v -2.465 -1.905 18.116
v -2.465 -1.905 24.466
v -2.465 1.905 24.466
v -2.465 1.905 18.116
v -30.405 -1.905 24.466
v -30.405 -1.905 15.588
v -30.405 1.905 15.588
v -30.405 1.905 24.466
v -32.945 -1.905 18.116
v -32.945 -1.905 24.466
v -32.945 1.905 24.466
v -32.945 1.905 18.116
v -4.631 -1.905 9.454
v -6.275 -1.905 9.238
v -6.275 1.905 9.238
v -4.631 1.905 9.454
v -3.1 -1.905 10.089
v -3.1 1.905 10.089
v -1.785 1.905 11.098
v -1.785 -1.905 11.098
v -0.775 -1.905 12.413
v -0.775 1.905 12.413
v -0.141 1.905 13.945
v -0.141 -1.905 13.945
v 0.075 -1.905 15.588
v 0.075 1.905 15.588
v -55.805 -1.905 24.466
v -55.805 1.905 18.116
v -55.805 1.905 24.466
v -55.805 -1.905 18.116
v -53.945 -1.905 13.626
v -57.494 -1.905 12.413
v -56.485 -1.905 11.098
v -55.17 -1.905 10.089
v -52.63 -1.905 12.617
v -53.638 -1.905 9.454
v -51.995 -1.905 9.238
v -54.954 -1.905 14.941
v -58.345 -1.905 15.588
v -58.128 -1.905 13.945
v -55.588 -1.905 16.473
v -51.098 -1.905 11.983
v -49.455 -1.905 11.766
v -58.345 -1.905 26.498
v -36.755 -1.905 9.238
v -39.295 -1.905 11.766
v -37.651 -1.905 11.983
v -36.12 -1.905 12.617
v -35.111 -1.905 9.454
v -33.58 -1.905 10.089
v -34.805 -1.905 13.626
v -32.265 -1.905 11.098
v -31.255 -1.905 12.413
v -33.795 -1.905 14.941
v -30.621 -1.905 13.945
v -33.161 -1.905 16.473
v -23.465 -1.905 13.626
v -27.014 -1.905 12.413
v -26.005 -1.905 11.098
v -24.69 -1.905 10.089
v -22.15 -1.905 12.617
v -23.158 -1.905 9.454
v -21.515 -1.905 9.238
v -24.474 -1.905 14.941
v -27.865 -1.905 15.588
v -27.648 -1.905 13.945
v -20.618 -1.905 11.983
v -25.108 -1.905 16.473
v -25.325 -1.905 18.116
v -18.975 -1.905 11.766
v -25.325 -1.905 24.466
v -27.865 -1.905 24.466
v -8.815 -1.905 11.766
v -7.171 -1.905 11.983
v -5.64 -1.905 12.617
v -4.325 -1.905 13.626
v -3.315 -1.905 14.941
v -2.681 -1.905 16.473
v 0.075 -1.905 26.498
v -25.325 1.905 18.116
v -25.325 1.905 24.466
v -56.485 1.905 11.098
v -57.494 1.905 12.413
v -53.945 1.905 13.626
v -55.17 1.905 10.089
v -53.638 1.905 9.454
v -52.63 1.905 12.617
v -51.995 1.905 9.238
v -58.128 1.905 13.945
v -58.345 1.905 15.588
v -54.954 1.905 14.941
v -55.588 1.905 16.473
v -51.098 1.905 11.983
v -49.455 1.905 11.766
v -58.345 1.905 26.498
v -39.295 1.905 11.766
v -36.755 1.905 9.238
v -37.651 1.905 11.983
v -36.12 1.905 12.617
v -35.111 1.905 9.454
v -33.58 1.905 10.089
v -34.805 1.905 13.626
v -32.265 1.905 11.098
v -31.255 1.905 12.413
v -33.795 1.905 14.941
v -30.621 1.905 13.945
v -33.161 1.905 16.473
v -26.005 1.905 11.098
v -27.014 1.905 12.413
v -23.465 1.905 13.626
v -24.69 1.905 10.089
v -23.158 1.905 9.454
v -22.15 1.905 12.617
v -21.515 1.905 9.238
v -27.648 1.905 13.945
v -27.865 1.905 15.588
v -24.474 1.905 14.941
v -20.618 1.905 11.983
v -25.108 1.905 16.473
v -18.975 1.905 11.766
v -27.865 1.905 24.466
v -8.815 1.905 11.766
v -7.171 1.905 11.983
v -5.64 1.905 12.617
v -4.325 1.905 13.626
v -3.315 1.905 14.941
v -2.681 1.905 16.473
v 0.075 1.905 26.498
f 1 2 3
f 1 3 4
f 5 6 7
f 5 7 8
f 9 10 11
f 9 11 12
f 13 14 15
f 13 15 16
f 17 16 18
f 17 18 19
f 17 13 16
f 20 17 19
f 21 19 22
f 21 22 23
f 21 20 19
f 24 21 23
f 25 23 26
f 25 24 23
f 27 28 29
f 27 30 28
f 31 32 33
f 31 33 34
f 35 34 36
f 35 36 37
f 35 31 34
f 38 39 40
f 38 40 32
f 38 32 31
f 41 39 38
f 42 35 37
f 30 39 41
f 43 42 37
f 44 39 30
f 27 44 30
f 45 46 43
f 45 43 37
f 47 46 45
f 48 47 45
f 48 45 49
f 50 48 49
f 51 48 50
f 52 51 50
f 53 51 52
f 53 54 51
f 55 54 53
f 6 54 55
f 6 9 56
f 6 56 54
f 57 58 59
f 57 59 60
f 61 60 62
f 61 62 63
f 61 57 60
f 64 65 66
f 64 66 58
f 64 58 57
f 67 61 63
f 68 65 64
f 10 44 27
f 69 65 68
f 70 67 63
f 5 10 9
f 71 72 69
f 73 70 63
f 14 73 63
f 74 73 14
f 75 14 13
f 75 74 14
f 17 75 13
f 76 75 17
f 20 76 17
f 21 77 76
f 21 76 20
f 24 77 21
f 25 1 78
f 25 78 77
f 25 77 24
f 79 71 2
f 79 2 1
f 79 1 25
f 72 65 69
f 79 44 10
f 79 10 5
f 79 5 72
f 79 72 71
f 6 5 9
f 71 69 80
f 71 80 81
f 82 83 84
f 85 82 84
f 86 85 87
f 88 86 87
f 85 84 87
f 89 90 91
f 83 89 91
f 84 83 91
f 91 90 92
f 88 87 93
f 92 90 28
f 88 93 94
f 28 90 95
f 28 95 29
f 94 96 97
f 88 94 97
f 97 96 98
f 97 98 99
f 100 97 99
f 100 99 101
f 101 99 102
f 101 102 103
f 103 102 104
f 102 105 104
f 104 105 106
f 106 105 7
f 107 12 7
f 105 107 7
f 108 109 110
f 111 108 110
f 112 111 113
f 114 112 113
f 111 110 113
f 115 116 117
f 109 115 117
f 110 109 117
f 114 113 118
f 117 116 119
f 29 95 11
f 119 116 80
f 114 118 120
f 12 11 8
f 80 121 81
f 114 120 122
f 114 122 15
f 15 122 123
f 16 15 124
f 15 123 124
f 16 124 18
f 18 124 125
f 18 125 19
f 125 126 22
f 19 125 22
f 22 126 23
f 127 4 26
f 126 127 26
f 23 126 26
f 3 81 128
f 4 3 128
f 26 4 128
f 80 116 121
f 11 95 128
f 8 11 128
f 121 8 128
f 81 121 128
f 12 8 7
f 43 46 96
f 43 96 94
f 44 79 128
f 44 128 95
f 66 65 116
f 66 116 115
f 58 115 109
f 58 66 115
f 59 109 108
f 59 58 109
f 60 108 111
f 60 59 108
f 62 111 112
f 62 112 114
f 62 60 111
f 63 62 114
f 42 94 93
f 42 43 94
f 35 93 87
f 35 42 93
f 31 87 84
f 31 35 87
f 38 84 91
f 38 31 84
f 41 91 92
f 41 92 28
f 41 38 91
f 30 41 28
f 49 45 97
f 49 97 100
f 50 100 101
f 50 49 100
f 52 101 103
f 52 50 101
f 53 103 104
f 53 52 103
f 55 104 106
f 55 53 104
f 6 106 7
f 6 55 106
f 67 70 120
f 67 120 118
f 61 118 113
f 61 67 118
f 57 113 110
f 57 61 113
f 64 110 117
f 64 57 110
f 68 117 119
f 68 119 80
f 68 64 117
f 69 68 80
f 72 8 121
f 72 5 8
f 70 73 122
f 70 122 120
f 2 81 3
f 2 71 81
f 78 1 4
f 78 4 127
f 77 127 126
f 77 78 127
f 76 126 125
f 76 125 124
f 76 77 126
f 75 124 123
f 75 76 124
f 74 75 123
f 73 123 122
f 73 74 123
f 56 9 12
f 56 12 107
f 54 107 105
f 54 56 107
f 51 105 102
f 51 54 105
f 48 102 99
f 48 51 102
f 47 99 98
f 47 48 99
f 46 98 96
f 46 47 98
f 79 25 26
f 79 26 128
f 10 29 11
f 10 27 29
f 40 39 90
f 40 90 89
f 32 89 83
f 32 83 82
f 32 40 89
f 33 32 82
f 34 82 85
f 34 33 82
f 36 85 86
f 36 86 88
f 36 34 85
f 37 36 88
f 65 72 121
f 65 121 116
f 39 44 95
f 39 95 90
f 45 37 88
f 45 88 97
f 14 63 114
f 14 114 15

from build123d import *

# Parameters (mm, degrees)
F0_W     = 2.54
F0_H     = 2.2360555756
F1_DEPTH = 1.905


with BuildPart() as f1:
    # F0 (on Front) → F1 (new body, symmetric)
    with BuildSketch(Plane.XZ):
        Polygon((-58.3446317705, 24.4664963263), (-55.8046317705, 24.4664963263), (-32.9446317705, 24.4664963263), (-30.4046317705, 24.4664963263), (-27.8646317705, 24.4664963263), (-25.3246317705, 24.4664963263), (-2.4646317705, 24.4664963263), (0.0753682295, 24.4664963263), (0.0753682295, 26.4984963263), (-58.3446317705, 26.4984963263), align=None)
        with BuildLine():
            Line((-55.8046317705, 18.1164963263), (-55.8046317705, 24.4664963263))
            Line((-55.8046317705, 24.4664963263), (-58.3446317705, 24.4664963263))
            Line((-58.3446317705, 24.4664963263), (-58.3446317705, 15.5880270362))
            ThreePointArc((-58.3446317705, 15.5880270362), (-56.484759831, 11.0978989757), (-51.9946317705, 9.2380270362))
            Line((-51.9946317705, 9.2380270362), (-36.7546317705, 9.2380270362))
            ThreePointArc((-36.7546317705, 9.2380270362), (-32.2645037099, 11.0978989757), (-30.4046317705, 15.5880270362))
            Line((-30.4046317705, 15.5880270362), (-30.4046317705, 22.2304407507))
            Line((-30.4046317705, 22.2304407507), (-32.9446317705, 22.2304407507))
            Line((-32.9446317705, 22.2304407507), (-32.9446317705, 18.1164963263))
            ThreePointArc((-32.9446317705, 18.1164963263), (-34.8045037099, 13.6263682658), (-39.2946317705, 11.7664963263))
            Line((-39.2946317705, 11.7664963263), (-49.4546317705, 11.7664963263))
            ThreePointArc((-49.4546317705, 11.7664963263), (-53.944759831, 13.6263682658), (-55.8046317705, 18.1164963263))
        make_face()
        with BuildLine():
            Line((-25.3246317705, 22.2304407507), (-27.8646317705, 22.2304407507))
            Line((-27.8646317705, 22.2304407507), (-27.8646317705, 15.5880270362))
            ThreePointArc((-27.8646317705, 15.5880270362), (-26.004759831, 11.0978989757), (-21.5146317705, 9.2380270362))
            Line((-21.5146317705, 9.2380270362), (-6.2746317705, 9.2380270362))
            ThreePointArc((-6.2746317705, 9.2380270362), (-1.7845037099, 11.0978989757), (0.0753682295, 15.5880270362))
            Line((0.0753682295, 15.5880270362), (0.0753682295, 24.4664963263))
            Line((0.0753682295, 24.4664963263), (-2.4646317705, 24.4664963263))
            Line((-2.4646317705, 24.4664963263), (-2.4646317705, 18.1164963263))
            ThreePointArc((-2.4646317705, 18.1164963263), (-4.3245037099, 13.6263682658), (-8.8146317705, 11.7664963263))
            Line((-8.8146317705, 11.7664963263), (-18.9746317705, 11.7664963263))
            ThreePointArc((-18.9746317705, 11.7664963263), (-23.464759831, 13.6263682658), (-25.3246317705, 18.1164963263))
            Line((-25.3246317705, 18.1164963263), (-25.3246317705, 22.2304407507))
        make_face()
        with Locations((-26.5946317705, 23.3484685385)):
            Rectangle(F0_W, F0_H)
        with Locations((-31.6746317705, 23.3484685385)):
            Rectangle(F0_W, F0_H)
    extrude(amount=F1_DEPTH, both=True)


solid = f1.part
